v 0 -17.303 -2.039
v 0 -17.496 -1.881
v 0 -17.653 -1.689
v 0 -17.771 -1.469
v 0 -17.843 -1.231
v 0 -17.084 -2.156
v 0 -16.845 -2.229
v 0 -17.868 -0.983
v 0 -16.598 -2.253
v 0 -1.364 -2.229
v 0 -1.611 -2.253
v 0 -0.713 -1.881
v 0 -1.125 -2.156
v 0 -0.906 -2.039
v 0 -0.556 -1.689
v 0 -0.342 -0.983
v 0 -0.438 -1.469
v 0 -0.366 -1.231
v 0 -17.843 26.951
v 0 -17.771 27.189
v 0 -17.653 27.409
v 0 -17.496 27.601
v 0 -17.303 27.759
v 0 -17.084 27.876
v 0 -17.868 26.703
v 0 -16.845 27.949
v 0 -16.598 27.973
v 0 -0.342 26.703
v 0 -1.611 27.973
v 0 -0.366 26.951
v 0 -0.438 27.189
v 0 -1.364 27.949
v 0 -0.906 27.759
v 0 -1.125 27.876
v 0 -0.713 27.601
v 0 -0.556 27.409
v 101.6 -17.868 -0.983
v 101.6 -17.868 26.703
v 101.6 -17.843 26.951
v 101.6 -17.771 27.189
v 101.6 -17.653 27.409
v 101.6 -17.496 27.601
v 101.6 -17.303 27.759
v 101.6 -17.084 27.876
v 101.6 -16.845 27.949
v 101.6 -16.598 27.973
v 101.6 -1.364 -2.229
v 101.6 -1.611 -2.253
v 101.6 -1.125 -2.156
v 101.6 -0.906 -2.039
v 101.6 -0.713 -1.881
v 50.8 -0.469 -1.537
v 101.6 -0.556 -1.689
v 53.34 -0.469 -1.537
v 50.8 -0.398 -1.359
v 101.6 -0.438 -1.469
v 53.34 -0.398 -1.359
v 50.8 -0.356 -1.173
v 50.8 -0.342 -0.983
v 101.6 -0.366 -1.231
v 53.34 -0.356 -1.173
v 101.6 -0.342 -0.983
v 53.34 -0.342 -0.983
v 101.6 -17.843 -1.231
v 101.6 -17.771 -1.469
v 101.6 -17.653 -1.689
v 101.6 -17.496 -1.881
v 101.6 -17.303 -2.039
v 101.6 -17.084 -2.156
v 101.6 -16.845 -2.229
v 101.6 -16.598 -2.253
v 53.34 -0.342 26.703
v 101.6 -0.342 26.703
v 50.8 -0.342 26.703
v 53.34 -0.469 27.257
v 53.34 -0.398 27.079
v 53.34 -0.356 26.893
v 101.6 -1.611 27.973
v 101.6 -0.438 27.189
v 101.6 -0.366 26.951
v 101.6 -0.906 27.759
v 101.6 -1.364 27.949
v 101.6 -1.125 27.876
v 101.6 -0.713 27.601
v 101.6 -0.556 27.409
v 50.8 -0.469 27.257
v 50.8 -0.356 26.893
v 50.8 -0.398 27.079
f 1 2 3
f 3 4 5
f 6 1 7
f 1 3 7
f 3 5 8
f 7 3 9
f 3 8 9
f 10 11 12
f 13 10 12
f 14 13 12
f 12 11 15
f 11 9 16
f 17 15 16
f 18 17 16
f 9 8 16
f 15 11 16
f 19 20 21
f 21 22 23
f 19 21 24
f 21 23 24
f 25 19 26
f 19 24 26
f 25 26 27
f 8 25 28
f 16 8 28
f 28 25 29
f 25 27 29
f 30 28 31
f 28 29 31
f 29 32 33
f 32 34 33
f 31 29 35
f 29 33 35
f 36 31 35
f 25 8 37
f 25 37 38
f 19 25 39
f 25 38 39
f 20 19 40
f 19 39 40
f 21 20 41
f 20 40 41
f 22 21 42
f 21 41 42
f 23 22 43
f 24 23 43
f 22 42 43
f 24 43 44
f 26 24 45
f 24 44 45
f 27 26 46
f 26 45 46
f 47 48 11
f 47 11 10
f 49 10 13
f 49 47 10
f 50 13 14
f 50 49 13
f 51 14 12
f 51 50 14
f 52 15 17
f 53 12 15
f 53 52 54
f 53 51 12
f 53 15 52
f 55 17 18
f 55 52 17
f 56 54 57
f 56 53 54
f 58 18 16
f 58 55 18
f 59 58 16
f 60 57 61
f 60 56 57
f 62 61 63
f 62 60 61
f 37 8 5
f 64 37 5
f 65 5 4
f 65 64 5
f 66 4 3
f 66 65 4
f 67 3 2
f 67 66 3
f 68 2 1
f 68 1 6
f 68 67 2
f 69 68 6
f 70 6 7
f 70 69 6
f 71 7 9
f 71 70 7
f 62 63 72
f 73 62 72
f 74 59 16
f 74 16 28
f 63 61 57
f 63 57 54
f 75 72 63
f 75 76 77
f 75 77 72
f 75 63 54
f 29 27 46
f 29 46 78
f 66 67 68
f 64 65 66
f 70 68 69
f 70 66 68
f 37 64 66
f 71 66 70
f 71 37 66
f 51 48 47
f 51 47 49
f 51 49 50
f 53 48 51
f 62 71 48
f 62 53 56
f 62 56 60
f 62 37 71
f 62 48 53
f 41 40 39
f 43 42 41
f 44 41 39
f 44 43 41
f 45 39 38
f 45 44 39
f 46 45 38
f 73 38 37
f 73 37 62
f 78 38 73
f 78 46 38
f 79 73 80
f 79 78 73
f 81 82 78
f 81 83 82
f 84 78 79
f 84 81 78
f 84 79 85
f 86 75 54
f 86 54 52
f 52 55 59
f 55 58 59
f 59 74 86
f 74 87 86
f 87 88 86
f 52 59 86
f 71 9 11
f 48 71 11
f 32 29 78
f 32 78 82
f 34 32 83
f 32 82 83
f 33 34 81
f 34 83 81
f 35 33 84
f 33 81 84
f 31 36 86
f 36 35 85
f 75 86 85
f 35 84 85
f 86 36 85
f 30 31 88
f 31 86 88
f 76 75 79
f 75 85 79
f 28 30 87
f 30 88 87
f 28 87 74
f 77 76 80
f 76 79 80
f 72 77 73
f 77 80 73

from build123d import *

# Parameters (mm, degrees)
F0_W     = 17.526
F0_H     = 30.226
F1_DEPTH = 101.6
F2_W     = 2.54
F2_H     = 30.226
F3_DEPTH = 0.127
F4_R     = 1.2699


# Not quite as in the source:
# - a fillet or chamfer is up to 0.001 mm smaller than in the source, because OpenCascade refuses the exact size


with BuildPart() as f1:
    # F0 (on Right) → F1 (new body)
    with BuildSketch(Plane.YZ):
        with Locations((-9.1045090495, 12.8600424648)):
            Rectangle(F0_W, F0_H)
    extrude(amount=F1_DEPTH)

    # F2 (on face) → F3 (cut)
    with BuildSketch(Plane(origin=(0, -0.3415090495, 0), x_dir=(-1, 0, 0), z_dir=(0, 1, 0))):
        with Locations((-52.07, 12.8600424648)):
            Rectangle(F2_W, F2_H)
    extrude(amount=-F3_DEPTH, mode=Mode.SUBTRACT)

    # F4 (radius 1.27 in the source; OpenCascade refuses exactly that, so slightly less here)
    f4_edges = [f1.edges().sort_by_distance(p)[0] for p in [
        (77.47, -0.341509, 27.973042),
        (50.8, -17.867509, 27.973042),
        (50.8, -17.867509, -2.252958),
        (25.4, -0.341509, -2.252958),
    ]]
    fillet(f4_edges, radius=F4_R)


solid = f1.part
